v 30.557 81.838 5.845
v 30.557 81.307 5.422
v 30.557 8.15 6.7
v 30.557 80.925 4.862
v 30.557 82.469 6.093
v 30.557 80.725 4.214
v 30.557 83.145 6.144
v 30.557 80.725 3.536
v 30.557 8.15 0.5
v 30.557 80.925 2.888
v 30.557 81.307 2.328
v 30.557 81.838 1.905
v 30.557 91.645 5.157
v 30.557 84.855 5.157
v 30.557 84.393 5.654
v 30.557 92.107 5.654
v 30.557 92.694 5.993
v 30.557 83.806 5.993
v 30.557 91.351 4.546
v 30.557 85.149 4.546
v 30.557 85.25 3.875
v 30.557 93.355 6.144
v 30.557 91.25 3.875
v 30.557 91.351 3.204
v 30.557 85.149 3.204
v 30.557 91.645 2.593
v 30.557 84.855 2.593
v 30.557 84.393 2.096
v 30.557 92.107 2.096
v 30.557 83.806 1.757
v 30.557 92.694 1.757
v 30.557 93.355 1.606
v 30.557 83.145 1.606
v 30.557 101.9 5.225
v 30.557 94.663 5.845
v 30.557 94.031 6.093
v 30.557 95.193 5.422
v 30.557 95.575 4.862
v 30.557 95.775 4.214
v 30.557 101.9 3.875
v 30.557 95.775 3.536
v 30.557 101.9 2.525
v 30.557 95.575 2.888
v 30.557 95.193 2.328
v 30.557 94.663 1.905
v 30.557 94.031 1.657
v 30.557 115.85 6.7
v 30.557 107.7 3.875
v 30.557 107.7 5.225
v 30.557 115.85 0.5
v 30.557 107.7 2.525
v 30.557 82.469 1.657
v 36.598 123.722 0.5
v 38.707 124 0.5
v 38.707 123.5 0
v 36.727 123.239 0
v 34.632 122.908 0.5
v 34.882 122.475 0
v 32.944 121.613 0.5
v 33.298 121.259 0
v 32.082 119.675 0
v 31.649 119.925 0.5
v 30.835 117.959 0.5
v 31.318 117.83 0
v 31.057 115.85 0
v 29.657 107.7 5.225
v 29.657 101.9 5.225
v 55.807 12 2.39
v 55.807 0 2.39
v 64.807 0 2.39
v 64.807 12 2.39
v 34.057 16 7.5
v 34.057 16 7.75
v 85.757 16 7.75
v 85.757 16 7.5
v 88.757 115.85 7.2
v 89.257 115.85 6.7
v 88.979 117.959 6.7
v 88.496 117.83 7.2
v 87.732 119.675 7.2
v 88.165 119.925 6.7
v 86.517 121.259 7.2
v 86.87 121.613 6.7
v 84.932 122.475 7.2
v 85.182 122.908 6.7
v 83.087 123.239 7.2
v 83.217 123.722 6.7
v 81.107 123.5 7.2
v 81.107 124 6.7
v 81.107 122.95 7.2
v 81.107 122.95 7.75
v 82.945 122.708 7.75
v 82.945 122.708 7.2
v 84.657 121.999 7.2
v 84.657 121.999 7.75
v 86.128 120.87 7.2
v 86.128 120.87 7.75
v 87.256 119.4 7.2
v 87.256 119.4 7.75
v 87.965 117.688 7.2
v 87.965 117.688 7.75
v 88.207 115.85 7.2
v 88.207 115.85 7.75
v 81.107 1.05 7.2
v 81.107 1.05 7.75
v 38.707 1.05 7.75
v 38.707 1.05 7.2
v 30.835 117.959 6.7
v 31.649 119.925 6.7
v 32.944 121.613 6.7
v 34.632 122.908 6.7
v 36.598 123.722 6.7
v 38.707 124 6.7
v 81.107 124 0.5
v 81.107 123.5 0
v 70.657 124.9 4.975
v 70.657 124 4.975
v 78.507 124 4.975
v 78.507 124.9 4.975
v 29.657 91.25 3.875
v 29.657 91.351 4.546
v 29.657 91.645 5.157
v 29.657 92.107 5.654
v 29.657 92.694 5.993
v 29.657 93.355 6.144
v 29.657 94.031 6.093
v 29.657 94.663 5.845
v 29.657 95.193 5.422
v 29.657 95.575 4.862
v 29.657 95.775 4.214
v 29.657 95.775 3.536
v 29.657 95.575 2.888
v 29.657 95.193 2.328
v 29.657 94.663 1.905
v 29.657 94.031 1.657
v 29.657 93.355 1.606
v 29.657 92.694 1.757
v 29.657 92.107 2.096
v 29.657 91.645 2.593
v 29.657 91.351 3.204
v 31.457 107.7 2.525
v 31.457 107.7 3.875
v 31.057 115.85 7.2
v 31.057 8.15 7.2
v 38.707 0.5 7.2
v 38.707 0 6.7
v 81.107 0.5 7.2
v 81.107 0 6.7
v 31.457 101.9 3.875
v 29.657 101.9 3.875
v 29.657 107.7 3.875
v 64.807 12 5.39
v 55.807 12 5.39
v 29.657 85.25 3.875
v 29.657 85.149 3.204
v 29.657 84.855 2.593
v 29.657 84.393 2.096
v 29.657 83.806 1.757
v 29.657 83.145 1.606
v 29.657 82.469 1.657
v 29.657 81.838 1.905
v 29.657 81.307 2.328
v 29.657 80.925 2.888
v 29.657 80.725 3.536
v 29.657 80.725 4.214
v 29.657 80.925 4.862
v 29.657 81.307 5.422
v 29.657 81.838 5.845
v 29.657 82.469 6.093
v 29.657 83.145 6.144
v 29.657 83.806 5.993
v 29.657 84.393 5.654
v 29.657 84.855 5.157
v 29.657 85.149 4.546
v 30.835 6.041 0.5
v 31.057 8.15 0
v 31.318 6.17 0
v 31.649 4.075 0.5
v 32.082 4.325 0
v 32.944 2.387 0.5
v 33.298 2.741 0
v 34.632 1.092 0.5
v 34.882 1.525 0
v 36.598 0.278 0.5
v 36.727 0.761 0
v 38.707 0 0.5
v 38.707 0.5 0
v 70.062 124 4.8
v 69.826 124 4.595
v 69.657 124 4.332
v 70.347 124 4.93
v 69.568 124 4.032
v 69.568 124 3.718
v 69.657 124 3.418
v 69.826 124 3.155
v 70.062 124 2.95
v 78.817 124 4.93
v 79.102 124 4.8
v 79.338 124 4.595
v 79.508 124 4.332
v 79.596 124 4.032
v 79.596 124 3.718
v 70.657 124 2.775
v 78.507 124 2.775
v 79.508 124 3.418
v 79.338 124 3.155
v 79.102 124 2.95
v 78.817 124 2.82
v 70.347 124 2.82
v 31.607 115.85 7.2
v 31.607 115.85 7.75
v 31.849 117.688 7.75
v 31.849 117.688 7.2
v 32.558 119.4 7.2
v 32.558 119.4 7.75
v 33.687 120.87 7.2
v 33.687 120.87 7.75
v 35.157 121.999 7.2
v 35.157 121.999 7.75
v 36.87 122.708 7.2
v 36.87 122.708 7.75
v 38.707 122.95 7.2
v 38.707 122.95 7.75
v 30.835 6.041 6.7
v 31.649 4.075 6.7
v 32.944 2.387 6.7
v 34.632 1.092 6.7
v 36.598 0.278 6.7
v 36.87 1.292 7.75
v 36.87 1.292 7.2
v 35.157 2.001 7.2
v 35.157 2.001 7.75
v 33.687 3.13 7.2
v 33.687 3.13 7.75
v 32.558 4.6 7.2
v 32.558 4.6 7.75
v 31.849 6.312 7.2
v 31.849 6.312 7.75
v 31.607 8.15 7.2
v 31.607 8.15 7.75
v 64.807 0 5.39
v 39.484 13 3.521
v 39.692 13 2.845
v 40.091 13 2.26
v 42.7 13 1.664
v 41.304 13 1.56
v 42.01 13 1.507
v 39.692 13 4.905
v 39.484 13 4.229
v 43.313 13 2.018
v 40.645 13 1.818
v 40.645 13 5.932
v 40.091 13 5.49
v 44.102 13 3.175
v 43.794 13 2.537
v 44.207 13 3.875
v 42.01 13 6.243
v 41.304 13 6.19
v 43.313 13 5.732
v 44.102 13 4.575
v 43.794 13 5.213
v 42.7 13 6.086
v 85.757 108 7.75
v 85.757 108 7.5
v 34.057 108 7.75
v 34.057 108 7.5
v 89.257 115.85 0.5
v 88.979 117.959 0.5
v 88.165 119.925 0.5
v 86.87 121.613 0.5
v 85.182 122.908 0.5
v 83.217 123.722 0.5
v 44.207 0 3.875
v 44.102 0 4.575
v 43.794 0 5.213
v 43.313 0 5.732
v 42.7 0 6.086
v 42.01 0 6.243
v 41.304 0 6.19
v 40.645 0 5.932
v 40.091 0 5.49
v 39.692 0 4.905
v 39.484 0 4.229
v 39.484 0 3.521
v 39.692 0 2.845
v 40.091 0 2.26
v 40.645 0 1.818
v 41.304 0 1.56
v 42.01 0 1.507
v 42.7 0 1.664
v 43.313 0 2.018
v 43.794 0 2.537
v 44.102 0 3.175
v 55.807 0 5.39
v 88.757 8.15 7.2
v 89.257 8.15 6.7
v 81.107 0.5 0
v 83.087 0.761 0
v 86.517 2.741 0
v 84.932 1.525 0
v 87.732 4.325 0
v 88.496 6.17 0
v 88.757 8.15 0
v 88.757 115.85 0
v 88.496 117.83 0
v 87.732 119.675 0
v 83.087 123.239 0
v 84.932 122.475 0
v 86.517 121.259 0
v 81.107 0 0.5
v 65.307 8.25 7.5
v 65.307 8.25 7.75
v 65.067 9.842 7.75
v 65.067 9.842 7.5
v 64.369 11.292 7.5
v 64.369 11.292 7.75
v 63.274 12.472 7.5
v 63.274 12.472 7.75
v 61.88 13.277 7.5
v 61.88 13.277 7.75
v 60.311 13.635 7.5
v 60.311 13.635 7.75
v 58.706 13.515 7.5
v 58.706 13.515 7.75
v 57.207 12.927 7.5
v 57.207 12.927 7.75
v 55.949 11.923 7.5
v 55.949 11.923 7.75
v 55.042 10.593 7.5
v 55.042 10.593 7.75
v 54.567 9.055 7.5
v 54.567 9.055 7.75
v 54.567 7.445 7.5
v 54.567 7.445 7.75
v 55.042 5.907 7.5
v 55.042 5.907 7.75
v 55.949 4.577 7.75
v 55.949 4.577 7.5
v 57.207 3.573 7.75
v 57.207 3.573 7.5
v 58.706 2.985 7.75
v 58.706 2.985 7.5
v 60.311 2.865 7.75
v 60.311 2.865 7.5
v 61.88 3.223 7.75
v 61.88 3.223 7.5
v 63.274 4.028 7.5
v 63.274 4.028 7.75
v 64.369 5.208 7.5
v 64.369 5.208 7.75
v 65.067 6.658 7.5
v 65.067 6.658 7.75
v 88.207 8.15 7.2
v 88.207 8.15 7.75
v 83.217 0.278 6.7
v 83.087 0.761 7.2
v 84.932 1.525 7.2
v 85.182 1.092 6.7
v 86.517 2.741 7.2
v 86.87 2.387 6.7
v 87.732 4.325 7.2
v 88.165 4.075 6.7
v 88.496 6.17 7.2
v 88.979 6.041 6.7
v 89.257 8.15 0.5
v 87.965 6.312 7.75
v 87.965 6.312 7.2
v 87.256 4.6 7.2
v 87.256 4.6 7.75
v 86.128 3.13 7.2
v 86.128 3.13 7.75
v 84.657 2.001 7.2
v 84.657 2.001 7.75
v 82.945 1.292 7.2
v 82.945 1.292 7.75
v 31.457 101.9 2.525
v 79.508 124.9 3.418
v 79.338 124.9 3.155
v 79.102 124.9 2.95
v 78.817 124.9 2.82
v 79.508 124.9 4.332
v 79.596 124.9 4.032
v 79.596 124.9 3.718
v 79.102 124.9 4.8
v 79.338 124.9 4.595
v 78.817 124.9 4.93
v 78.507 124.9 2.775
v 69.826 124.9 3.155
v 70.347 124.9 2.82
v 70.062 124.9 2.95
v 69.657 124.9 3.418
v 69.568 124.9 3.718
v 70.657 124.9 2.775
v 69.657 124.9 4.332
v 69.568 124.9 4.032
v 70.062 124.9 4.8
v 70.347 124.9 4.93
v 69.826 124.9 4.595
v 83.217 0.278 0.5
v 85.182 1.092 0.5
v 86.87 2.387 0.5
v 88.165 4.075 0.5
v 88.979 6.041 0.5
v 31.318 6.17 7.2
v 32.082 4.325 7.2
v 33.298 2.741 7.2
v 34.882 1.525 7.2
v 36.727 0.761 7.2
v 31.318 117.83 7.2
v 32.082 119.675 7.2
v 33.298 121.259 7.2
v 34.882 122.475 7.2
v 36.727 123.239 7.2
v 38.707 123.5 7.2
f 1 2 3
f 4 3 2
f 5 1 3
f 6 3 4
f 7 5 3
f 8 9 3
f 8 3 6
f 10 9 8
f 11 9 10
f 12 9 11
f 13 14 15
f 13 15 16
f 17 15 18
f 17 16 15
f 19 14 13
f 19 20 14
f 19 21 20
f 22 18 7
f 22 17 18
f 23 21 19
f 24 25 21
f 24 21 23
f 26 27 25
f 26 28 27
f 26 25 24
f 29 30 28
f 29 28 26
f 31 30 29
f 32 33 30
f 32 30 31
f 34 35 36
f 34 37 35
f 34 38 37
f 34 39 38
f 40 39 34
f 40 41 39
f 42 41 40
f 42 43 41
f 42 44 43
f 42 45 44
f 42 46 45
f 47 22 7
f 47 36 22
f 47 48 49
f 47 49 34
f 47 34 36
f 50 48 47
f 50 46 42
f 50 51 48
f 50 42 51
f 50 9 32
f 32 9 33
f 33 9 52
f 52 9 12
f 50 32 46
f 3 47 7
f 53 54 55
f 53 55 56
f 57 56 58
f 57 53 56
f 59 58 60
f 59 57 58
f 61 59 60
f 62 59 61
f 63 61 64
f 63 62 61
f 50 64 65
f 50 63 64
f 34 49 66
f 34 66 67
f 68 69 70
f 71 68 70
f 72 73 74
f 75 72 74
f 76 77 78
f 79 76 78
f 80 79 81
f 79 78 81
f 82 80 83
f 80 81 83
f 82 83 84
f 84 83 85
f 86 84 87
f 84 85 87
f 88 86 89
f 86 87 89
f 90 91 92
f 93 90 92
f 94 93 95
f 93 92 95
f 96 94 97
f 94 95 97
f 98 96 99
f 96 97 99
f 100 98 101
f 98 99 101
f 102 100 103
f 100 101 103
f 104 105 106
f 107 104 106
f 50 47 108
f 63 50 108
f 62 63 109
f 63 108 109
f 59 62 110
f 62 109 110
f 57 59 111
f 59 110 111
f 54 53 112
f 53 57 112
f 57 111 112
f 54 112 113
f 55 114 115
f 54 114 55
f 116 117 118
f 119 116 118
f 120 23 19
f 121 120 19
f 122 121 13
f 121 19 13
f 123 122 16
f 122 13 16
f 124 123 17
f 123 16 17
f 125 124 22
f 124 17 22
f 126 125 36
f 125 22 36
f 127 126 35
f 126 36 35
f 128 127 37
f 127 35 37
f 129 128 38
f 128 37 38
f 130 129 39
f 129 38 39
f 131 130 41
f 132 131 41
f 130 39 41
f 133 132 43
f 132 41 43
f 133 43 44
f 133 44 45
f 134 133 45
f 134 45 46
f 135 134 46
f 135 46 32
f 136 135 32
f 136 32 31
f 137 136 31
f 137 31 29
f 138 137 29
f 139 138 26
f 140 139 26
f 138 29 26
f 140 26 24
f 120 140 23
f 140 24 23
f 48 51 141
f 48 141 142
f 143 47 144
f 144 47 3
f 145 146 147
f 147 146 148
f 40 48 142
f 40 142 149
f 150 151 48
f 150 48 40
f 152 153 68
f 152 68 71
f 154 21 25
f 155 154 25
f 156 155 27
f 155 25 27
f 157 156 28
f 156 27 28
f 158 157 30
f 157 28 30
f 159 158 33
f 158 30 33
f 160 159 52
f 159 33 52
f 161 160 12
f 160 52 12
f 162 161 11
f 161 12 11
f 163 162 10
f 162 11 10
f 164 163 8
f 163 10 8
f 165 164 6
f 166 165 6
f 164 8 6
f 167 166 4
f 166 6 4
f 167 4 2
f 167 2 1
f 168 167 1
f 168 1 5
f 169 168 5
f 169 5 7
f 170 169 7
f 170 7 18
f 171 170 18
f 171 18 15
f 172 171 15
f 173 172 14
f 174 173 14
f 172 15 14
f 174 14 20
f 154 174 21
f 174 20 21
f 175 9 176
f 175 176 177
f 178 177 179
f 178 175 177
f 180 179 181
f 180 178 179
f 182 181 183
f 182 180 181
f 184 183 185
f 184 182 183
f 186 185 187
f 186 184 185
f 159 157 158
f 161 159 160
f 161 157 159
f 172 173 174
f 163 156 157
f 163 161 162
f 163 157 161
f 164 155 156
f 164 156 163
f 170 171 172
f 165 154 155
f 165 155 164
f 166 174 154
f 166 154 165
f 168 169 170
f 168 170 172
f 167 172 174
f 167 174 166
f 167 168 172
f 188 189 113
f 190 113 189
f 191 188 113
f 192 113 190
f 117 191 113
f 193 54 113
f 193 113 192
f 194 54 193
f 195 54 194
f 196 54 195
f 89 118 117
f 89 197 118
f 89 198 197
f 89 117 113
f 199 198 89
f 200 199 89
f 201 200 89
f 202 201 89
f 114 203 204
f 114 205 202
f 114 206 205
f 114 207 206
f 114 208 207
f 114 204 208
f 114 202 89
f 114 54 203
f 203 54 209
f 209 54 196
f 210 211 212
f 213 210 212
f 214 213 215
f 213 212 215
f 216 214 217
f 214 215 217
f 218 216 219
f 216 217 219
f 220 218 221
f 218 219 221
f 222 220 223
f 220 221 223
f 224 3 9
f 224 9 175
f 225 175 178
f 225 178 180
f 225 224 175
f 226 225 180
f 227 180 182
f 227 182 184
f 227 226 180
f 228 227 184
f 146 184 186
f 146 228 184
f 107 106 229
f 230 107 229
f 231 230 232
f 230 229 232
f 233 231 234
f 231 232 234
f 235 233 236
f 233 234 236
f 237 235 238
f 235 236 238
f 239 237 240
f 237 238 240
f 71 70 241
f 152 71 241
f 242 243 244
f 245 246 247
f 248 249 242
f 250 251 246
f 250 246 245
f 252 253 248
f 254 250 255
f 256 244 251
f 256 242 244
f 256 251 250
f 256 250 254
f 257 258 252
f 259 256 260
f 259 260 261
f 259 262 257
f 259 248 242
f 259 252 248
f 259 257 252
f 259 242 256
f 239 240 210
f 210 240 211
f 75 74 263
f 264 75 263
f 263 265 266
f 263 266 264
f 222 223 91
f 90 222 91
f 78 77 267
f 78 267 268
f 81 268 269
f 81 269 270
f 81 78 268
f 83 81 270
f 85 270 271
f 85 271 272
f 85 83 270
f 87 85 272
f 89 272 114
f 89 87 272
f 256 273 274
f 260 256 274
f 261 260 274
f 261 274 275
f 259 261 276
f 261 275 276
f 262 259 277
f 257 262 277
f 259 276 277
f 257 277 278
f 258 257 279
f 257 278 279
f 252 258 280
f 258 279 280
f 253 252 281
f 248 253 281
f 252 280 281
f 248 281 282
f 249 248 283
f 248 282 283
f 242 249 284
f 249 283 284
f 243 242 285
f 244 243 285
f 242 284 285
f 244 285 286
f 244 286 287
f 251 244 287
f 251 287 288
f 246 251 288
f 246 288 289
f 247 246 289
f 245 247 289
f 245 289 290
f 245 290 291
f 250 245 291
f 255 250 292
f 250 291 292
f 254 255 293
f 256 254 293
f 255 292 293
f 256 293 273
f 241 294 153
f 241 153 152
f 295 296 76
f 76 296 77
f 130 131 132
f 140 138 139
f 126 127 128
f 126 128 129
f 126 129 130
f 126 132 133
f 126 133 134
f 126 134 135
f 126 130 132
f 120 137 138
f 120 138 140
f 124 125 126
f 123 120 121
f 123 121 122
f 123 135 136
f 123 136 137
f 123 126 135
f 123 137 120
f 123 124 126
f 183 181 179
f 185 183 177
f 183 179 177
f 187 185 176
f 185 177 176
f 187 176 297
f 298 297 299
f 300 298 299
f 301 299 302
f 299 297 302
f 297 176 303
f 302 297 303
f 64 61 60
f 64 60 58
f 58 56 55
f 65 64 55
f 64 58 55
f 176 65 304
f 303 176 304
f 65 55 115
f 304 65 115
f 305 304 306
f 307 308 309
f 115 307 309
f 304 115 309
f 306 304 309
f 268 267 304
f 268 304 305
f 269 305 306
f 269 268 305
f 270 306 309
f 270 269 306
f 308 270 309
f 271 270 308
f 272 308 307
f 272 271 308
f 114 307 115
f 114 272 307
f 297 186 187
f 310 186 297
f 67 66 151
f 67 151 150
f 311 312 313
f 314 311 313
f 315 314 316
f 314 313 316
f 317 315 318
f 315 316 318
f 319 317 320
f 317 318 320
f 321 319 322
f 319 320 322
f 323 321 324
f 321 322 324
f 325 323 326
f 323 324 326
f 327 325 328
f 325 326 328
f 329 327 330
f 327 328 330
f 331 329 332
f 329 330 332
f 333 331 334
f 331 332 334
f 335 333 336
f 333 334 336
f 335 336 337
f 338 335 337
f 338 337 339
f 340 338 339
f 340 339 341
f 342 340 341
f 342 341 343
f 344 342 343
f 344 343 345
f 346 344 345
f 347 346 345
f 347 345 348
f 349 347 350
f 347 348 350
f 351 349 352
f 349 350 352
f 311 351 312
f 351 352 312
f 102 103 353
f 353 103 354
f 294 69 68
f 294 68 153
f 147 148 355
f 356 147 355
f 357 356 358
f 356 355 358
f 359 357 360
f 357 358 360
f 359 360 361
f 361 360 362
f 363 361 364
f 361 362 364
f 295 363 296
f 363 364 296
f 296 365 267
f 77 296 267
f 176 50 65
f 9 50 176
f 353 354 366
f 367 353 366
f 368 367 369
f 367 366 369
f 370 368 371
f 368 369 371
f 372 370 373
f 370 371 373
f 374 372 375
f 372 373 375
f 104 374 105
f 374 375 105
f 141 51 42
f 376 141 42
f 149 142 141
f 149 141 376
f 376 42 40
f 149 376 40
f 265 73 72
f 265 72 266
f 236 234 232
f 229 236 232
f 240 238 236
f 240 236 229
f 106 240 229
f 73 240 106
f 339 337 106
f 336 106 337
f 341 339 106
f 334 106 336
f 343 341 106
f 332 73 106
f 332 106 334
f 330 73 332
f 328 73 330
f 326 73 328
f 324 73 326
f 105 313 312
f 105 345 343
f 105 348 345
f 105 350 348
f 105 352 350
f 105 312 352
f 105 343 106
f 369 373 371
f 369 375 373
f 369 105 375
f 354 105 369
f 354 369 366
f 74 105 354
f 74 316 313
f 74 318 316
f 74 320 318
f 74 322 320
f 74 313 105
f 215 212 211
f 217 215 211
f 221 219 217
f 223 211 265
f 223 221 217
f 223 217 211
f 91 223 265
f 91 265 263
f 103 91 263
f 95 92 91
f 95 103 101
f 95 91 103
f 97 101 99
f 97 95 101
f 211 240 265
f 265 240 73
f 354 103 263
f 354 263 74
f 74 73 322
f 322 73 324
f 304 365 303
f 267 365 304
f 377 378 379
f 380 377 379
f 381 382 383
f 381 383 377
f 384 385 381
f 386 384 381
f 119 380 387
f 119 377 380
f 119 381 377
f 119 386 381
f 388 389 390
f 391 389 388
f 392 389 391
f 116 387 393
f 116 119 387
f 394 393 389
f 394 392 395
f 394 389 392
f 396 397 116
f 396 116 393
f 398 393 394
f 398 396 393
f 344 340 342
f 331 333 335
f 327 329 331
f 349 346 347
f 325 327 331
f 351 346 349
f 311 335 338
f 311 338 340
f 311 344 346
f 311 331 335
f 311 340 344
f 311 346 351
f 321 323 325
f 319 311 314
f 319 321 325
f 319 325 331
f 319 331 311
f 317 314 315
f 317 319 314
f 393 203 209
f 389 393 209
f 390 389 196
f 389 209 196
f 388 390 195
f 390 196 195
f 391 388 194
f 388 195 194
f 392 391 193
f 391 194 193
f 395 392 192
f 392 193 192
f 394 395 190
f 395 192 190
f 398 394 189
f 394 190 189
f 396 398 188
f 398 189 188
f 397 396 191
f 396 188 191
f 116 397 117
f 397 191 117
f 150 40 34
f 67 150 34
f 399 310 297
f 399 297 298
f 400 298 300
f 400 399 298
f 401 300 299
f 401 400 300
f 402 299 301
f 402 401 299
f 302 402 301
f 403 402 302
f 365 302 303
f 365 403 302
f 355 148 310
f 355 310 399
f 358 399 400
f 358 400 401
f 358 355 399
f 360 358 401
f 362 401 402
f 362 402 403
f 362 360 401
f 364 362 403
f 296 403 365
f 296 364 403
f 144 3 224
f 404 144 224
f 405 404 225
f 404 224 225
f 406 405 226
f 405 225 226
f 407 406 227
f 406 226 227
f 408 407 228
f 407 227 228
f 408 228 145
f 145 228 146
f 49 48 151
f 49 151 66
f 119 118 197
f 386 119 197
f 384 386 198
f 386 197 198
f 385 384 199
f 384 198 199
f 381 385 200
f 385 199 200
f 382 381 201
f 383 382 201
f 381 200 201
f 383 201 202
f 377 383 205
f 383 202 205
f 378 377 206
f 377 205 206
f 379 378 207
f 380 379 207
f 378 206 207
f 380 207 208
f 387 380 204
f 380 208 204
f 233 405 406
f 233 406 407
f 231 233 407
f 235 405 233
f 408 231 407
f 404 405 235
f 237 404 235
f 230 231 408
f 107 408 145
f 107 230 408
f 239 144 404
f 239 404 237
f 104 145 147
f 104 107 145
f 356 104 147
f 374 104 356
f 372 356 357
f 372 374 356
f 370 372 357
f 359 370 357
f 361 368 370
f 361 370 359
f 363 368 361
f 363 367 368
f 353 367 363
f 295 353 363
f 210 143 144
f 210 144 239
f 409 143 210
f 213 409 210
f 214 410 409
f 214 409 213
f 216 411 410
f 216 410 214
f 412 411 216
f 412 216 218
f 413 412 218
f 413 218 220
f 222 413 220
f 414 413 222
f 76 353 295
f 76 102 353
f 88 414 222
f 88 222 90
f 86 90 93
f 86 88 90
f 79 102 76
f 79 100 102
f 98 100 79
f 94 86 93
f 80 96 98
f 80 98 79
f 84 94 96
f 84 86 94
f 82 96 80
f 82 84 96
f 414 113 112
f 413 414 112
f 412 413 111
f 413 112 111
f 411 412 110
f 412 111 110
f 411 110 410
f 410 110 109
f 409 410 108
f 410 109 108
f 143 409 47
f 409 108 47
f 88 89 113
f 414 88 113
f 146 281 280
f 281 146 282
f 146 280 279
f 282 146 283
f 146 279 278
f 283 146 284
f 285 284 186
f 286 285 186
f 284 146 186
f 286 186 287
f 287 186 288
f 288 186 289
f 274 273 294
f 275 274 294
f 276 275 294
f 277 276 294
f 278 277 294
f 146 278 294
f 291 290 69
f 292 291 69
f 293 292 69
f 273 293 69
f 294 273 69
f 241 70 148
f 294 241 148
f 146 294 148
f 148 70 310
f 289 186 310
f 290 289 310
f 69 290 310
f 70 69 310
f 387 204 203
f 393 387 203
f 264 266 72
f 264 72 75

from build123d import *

# Parameters (mm, degrees)
F0_W      = 58.7
F0_H      = 124
F1_DEPTH  = 7.75
F5_R      = 8.15
F4_R      = 2.374986
F7_DEPTH  = 13
F8_DEPTH  = 0.9
F3_R      = 2.275
F3_W      = 5.8
F3_H      = 1.35
F9_DEPTH  = 0.9
F10_DEPTH = 0.9
F4_W      = 9
F4_H      = 3
F11_DEPTH = 12
F2_R      = 5.4
F12_DEPTH = 0.25
F14_DEPTH = 0.55
F15_SIZE  = 0.5
F2_W      = 51.7
F2_H      = 92
F16_DEPTH = 0.25


with BuildPart() as f1:
    # F0 (on Top) → F1 (new body)
    with BuildSketch(Plane.XY):
        with Locations((59.907148, 62)):
            Rectangle(F0_W, F0_H)
    extrude(amount=F1_DEPTH)

    # F5
    f5_edges = [f1.edges().sort_by_distance(p)[0] for p in [
        (30.557148, 124, 3.875),
        (89.257148, 124, 3.875),
        (30.557148, 0, 3.875),
        (89.257148, 0, 3.875),
    ]]
    fillet(f5_edges, radius=F5_R)

    # F4 (on face) → F7 (cut)
    with BuildSketch(Plane.XZ):
        with Locations((41.832148, 3.875)):
            Circle(F4_R)
    extrude(amount=-F7_DEPTH, mode=Mode.SUBTRACT)

    # F6 (on face) → F8 (join)
    with BuildSketch(Plane(origin=(0, 124, 0), x_dir=(-1, 0, 0), z_dir=(0, 1, 0))):
        with BuildLine():
            Line((-70.657148, 4.975), (-78.507148, 4.975))
            ThreePointArc((-78.507148, 4.975), (-79.607148, 3.875), (-78.507148, 2.775))
            Line((-78.507148, 2.775), (-70.657148, 2.775))
            ThreePointArc((-70.657148, 2.775), (-69.557148, 3.875), (-70.657148, 4.975))
        make_face()
    extrude(amount=F8_DEPTH)

    # F3 (on face) → F9 (join)
    with BuildSketch(Plane(origin=(30.557148, 0, 0), x_dir=(0, -1, 0), z_dir=(-1, 0, 0))):
        with Locations((-93.525, 3.875)):
            Circle(F3_R)
        with BuildLine():
            ThreePointArc((-80.7, 3.875), (-82.975, 6.15), (-85.25, 3.875))
            ThreePointArc((-85.25, 3.875), (-82.975, 1.6), (-80.7, 3.875))
        make_face()
        with Locations((-104.8, 4.55)):
            Rectangle(F3_W, F3_H)
    extrude(amount=F9_DEPTH)

    # F3 (on face) → F10 (cut)
    with BuildSketch(Plane(origin=(30.557148, 0, 0), x_dir=(0, -1, 0), z_dir=(-1, 0, 0))):
        with Locations((-104.8, 3.2)):
            Rectangle(F3_W, F3_H)
    extrude(amount=-F10_DEPTH, mode=Mode.SUBTRACT)

    # F4 (on face) → F11 (cut)
    with BuildSketch(Plane.XZ):
        with Locations((60.307148, 3.889738)):
            Rectangle(F4_W, F4_H)
    extrude(amount=-F11_DEPTH, mode=Mode.SUBTRACT)

    # F2 (on face) → F12 (cut)
    with BuildSketch(Plane.XY.offset(7.75)):
        with Locations((59.907148, 8.25)):
            Circle(F2_R)
    extrude(amount=-F12_DEPTH, mode=Mode.SUBTRACT)

    # F13 (on face) → F14 (cut)
    with BuildSketch(Plane.XY.offset(7.75)):
        with BuildLine():
            Line((38.707148, 0), (81.107148, 0))
            ThreePointArc((81.107148, 0), (86.870068, 2.38708), (89.257148, 8.15))
            Line((89.257148, 8.15), (89.257148, 115.85))
            ThreePointArc((89.257148, 115.85), (86.870068, 121.61292), (81.107148, 124))
            Line((81.107148, 124), (38.707148, 124))
            ThreePointArc((38.707148, 124), (32.944228, 121.61292), (30.557148, 115.85))
            Line((30.557148, 115.85), (30.557148, 8.15))
            ThreePointArc((30.557148, 8.15), (32.944228, 2.38708), (38.707148, 0))
        make_face()
        with BuildLine():
            Line((88.207148, 115.85), (88.207148, 8.15))
            ThreePointArc((88.207148, 8.15), (86.127606, 3.129542), (81.107148, 1.05))
            Line((81.107148, 1.05), (38.707148, 1.05))
            ThreePointArc((38.707148, 1.05), (33.68669, 3.129542), (31.607148, 8.15))
            Line((31.607148, 8.15), (31.607148, 115.85))
            ThreePointArc((31.607148, 115.85), (33.68669, 120.870458), (38.707148, 122.95))
            Line((38.707148, 122.95), (81.107148, 122.95))
            ThreePointArc((81.107148, 122.95), (86.127606, 120.870458), (88.207148, 115.85))
        make_face(mode=Mode.SUBTRACT)
    extrude(amount=-F14_DEPTH, mode=Mode.SUBTRACT)

    # F15
    f15_edges = [f1.edges().sort_by_distance(p)[0] for p in [
        (59.907148, 124, 7.2),
        (86.870068, 121.61292, 7.2),
        (89.257148, 62, 7.2),
        (86.870068, 2.38708, 7.2),
        (59.907148, 0, 7.2),
        (32.944228, 2.38708, 7.2),
        (30.557148, 62, 7.2),
        (32.944228, 121.61292, 7.2),
        (89.257148, 62, 0),
    ]]
    chamfer(f15_edges, length=F15_SIZE)

    # F2 (on face) → F16 (cut)
    with BuildSketch(Plane.XY.offset(7.75)):
        with Locations((59.907148, 62)):
            Rectangle(F2_W, F2_H)
    extrude(amount=-F16_DEPTH, mode=Mode.SUBTRACT)


solid = f1.part
